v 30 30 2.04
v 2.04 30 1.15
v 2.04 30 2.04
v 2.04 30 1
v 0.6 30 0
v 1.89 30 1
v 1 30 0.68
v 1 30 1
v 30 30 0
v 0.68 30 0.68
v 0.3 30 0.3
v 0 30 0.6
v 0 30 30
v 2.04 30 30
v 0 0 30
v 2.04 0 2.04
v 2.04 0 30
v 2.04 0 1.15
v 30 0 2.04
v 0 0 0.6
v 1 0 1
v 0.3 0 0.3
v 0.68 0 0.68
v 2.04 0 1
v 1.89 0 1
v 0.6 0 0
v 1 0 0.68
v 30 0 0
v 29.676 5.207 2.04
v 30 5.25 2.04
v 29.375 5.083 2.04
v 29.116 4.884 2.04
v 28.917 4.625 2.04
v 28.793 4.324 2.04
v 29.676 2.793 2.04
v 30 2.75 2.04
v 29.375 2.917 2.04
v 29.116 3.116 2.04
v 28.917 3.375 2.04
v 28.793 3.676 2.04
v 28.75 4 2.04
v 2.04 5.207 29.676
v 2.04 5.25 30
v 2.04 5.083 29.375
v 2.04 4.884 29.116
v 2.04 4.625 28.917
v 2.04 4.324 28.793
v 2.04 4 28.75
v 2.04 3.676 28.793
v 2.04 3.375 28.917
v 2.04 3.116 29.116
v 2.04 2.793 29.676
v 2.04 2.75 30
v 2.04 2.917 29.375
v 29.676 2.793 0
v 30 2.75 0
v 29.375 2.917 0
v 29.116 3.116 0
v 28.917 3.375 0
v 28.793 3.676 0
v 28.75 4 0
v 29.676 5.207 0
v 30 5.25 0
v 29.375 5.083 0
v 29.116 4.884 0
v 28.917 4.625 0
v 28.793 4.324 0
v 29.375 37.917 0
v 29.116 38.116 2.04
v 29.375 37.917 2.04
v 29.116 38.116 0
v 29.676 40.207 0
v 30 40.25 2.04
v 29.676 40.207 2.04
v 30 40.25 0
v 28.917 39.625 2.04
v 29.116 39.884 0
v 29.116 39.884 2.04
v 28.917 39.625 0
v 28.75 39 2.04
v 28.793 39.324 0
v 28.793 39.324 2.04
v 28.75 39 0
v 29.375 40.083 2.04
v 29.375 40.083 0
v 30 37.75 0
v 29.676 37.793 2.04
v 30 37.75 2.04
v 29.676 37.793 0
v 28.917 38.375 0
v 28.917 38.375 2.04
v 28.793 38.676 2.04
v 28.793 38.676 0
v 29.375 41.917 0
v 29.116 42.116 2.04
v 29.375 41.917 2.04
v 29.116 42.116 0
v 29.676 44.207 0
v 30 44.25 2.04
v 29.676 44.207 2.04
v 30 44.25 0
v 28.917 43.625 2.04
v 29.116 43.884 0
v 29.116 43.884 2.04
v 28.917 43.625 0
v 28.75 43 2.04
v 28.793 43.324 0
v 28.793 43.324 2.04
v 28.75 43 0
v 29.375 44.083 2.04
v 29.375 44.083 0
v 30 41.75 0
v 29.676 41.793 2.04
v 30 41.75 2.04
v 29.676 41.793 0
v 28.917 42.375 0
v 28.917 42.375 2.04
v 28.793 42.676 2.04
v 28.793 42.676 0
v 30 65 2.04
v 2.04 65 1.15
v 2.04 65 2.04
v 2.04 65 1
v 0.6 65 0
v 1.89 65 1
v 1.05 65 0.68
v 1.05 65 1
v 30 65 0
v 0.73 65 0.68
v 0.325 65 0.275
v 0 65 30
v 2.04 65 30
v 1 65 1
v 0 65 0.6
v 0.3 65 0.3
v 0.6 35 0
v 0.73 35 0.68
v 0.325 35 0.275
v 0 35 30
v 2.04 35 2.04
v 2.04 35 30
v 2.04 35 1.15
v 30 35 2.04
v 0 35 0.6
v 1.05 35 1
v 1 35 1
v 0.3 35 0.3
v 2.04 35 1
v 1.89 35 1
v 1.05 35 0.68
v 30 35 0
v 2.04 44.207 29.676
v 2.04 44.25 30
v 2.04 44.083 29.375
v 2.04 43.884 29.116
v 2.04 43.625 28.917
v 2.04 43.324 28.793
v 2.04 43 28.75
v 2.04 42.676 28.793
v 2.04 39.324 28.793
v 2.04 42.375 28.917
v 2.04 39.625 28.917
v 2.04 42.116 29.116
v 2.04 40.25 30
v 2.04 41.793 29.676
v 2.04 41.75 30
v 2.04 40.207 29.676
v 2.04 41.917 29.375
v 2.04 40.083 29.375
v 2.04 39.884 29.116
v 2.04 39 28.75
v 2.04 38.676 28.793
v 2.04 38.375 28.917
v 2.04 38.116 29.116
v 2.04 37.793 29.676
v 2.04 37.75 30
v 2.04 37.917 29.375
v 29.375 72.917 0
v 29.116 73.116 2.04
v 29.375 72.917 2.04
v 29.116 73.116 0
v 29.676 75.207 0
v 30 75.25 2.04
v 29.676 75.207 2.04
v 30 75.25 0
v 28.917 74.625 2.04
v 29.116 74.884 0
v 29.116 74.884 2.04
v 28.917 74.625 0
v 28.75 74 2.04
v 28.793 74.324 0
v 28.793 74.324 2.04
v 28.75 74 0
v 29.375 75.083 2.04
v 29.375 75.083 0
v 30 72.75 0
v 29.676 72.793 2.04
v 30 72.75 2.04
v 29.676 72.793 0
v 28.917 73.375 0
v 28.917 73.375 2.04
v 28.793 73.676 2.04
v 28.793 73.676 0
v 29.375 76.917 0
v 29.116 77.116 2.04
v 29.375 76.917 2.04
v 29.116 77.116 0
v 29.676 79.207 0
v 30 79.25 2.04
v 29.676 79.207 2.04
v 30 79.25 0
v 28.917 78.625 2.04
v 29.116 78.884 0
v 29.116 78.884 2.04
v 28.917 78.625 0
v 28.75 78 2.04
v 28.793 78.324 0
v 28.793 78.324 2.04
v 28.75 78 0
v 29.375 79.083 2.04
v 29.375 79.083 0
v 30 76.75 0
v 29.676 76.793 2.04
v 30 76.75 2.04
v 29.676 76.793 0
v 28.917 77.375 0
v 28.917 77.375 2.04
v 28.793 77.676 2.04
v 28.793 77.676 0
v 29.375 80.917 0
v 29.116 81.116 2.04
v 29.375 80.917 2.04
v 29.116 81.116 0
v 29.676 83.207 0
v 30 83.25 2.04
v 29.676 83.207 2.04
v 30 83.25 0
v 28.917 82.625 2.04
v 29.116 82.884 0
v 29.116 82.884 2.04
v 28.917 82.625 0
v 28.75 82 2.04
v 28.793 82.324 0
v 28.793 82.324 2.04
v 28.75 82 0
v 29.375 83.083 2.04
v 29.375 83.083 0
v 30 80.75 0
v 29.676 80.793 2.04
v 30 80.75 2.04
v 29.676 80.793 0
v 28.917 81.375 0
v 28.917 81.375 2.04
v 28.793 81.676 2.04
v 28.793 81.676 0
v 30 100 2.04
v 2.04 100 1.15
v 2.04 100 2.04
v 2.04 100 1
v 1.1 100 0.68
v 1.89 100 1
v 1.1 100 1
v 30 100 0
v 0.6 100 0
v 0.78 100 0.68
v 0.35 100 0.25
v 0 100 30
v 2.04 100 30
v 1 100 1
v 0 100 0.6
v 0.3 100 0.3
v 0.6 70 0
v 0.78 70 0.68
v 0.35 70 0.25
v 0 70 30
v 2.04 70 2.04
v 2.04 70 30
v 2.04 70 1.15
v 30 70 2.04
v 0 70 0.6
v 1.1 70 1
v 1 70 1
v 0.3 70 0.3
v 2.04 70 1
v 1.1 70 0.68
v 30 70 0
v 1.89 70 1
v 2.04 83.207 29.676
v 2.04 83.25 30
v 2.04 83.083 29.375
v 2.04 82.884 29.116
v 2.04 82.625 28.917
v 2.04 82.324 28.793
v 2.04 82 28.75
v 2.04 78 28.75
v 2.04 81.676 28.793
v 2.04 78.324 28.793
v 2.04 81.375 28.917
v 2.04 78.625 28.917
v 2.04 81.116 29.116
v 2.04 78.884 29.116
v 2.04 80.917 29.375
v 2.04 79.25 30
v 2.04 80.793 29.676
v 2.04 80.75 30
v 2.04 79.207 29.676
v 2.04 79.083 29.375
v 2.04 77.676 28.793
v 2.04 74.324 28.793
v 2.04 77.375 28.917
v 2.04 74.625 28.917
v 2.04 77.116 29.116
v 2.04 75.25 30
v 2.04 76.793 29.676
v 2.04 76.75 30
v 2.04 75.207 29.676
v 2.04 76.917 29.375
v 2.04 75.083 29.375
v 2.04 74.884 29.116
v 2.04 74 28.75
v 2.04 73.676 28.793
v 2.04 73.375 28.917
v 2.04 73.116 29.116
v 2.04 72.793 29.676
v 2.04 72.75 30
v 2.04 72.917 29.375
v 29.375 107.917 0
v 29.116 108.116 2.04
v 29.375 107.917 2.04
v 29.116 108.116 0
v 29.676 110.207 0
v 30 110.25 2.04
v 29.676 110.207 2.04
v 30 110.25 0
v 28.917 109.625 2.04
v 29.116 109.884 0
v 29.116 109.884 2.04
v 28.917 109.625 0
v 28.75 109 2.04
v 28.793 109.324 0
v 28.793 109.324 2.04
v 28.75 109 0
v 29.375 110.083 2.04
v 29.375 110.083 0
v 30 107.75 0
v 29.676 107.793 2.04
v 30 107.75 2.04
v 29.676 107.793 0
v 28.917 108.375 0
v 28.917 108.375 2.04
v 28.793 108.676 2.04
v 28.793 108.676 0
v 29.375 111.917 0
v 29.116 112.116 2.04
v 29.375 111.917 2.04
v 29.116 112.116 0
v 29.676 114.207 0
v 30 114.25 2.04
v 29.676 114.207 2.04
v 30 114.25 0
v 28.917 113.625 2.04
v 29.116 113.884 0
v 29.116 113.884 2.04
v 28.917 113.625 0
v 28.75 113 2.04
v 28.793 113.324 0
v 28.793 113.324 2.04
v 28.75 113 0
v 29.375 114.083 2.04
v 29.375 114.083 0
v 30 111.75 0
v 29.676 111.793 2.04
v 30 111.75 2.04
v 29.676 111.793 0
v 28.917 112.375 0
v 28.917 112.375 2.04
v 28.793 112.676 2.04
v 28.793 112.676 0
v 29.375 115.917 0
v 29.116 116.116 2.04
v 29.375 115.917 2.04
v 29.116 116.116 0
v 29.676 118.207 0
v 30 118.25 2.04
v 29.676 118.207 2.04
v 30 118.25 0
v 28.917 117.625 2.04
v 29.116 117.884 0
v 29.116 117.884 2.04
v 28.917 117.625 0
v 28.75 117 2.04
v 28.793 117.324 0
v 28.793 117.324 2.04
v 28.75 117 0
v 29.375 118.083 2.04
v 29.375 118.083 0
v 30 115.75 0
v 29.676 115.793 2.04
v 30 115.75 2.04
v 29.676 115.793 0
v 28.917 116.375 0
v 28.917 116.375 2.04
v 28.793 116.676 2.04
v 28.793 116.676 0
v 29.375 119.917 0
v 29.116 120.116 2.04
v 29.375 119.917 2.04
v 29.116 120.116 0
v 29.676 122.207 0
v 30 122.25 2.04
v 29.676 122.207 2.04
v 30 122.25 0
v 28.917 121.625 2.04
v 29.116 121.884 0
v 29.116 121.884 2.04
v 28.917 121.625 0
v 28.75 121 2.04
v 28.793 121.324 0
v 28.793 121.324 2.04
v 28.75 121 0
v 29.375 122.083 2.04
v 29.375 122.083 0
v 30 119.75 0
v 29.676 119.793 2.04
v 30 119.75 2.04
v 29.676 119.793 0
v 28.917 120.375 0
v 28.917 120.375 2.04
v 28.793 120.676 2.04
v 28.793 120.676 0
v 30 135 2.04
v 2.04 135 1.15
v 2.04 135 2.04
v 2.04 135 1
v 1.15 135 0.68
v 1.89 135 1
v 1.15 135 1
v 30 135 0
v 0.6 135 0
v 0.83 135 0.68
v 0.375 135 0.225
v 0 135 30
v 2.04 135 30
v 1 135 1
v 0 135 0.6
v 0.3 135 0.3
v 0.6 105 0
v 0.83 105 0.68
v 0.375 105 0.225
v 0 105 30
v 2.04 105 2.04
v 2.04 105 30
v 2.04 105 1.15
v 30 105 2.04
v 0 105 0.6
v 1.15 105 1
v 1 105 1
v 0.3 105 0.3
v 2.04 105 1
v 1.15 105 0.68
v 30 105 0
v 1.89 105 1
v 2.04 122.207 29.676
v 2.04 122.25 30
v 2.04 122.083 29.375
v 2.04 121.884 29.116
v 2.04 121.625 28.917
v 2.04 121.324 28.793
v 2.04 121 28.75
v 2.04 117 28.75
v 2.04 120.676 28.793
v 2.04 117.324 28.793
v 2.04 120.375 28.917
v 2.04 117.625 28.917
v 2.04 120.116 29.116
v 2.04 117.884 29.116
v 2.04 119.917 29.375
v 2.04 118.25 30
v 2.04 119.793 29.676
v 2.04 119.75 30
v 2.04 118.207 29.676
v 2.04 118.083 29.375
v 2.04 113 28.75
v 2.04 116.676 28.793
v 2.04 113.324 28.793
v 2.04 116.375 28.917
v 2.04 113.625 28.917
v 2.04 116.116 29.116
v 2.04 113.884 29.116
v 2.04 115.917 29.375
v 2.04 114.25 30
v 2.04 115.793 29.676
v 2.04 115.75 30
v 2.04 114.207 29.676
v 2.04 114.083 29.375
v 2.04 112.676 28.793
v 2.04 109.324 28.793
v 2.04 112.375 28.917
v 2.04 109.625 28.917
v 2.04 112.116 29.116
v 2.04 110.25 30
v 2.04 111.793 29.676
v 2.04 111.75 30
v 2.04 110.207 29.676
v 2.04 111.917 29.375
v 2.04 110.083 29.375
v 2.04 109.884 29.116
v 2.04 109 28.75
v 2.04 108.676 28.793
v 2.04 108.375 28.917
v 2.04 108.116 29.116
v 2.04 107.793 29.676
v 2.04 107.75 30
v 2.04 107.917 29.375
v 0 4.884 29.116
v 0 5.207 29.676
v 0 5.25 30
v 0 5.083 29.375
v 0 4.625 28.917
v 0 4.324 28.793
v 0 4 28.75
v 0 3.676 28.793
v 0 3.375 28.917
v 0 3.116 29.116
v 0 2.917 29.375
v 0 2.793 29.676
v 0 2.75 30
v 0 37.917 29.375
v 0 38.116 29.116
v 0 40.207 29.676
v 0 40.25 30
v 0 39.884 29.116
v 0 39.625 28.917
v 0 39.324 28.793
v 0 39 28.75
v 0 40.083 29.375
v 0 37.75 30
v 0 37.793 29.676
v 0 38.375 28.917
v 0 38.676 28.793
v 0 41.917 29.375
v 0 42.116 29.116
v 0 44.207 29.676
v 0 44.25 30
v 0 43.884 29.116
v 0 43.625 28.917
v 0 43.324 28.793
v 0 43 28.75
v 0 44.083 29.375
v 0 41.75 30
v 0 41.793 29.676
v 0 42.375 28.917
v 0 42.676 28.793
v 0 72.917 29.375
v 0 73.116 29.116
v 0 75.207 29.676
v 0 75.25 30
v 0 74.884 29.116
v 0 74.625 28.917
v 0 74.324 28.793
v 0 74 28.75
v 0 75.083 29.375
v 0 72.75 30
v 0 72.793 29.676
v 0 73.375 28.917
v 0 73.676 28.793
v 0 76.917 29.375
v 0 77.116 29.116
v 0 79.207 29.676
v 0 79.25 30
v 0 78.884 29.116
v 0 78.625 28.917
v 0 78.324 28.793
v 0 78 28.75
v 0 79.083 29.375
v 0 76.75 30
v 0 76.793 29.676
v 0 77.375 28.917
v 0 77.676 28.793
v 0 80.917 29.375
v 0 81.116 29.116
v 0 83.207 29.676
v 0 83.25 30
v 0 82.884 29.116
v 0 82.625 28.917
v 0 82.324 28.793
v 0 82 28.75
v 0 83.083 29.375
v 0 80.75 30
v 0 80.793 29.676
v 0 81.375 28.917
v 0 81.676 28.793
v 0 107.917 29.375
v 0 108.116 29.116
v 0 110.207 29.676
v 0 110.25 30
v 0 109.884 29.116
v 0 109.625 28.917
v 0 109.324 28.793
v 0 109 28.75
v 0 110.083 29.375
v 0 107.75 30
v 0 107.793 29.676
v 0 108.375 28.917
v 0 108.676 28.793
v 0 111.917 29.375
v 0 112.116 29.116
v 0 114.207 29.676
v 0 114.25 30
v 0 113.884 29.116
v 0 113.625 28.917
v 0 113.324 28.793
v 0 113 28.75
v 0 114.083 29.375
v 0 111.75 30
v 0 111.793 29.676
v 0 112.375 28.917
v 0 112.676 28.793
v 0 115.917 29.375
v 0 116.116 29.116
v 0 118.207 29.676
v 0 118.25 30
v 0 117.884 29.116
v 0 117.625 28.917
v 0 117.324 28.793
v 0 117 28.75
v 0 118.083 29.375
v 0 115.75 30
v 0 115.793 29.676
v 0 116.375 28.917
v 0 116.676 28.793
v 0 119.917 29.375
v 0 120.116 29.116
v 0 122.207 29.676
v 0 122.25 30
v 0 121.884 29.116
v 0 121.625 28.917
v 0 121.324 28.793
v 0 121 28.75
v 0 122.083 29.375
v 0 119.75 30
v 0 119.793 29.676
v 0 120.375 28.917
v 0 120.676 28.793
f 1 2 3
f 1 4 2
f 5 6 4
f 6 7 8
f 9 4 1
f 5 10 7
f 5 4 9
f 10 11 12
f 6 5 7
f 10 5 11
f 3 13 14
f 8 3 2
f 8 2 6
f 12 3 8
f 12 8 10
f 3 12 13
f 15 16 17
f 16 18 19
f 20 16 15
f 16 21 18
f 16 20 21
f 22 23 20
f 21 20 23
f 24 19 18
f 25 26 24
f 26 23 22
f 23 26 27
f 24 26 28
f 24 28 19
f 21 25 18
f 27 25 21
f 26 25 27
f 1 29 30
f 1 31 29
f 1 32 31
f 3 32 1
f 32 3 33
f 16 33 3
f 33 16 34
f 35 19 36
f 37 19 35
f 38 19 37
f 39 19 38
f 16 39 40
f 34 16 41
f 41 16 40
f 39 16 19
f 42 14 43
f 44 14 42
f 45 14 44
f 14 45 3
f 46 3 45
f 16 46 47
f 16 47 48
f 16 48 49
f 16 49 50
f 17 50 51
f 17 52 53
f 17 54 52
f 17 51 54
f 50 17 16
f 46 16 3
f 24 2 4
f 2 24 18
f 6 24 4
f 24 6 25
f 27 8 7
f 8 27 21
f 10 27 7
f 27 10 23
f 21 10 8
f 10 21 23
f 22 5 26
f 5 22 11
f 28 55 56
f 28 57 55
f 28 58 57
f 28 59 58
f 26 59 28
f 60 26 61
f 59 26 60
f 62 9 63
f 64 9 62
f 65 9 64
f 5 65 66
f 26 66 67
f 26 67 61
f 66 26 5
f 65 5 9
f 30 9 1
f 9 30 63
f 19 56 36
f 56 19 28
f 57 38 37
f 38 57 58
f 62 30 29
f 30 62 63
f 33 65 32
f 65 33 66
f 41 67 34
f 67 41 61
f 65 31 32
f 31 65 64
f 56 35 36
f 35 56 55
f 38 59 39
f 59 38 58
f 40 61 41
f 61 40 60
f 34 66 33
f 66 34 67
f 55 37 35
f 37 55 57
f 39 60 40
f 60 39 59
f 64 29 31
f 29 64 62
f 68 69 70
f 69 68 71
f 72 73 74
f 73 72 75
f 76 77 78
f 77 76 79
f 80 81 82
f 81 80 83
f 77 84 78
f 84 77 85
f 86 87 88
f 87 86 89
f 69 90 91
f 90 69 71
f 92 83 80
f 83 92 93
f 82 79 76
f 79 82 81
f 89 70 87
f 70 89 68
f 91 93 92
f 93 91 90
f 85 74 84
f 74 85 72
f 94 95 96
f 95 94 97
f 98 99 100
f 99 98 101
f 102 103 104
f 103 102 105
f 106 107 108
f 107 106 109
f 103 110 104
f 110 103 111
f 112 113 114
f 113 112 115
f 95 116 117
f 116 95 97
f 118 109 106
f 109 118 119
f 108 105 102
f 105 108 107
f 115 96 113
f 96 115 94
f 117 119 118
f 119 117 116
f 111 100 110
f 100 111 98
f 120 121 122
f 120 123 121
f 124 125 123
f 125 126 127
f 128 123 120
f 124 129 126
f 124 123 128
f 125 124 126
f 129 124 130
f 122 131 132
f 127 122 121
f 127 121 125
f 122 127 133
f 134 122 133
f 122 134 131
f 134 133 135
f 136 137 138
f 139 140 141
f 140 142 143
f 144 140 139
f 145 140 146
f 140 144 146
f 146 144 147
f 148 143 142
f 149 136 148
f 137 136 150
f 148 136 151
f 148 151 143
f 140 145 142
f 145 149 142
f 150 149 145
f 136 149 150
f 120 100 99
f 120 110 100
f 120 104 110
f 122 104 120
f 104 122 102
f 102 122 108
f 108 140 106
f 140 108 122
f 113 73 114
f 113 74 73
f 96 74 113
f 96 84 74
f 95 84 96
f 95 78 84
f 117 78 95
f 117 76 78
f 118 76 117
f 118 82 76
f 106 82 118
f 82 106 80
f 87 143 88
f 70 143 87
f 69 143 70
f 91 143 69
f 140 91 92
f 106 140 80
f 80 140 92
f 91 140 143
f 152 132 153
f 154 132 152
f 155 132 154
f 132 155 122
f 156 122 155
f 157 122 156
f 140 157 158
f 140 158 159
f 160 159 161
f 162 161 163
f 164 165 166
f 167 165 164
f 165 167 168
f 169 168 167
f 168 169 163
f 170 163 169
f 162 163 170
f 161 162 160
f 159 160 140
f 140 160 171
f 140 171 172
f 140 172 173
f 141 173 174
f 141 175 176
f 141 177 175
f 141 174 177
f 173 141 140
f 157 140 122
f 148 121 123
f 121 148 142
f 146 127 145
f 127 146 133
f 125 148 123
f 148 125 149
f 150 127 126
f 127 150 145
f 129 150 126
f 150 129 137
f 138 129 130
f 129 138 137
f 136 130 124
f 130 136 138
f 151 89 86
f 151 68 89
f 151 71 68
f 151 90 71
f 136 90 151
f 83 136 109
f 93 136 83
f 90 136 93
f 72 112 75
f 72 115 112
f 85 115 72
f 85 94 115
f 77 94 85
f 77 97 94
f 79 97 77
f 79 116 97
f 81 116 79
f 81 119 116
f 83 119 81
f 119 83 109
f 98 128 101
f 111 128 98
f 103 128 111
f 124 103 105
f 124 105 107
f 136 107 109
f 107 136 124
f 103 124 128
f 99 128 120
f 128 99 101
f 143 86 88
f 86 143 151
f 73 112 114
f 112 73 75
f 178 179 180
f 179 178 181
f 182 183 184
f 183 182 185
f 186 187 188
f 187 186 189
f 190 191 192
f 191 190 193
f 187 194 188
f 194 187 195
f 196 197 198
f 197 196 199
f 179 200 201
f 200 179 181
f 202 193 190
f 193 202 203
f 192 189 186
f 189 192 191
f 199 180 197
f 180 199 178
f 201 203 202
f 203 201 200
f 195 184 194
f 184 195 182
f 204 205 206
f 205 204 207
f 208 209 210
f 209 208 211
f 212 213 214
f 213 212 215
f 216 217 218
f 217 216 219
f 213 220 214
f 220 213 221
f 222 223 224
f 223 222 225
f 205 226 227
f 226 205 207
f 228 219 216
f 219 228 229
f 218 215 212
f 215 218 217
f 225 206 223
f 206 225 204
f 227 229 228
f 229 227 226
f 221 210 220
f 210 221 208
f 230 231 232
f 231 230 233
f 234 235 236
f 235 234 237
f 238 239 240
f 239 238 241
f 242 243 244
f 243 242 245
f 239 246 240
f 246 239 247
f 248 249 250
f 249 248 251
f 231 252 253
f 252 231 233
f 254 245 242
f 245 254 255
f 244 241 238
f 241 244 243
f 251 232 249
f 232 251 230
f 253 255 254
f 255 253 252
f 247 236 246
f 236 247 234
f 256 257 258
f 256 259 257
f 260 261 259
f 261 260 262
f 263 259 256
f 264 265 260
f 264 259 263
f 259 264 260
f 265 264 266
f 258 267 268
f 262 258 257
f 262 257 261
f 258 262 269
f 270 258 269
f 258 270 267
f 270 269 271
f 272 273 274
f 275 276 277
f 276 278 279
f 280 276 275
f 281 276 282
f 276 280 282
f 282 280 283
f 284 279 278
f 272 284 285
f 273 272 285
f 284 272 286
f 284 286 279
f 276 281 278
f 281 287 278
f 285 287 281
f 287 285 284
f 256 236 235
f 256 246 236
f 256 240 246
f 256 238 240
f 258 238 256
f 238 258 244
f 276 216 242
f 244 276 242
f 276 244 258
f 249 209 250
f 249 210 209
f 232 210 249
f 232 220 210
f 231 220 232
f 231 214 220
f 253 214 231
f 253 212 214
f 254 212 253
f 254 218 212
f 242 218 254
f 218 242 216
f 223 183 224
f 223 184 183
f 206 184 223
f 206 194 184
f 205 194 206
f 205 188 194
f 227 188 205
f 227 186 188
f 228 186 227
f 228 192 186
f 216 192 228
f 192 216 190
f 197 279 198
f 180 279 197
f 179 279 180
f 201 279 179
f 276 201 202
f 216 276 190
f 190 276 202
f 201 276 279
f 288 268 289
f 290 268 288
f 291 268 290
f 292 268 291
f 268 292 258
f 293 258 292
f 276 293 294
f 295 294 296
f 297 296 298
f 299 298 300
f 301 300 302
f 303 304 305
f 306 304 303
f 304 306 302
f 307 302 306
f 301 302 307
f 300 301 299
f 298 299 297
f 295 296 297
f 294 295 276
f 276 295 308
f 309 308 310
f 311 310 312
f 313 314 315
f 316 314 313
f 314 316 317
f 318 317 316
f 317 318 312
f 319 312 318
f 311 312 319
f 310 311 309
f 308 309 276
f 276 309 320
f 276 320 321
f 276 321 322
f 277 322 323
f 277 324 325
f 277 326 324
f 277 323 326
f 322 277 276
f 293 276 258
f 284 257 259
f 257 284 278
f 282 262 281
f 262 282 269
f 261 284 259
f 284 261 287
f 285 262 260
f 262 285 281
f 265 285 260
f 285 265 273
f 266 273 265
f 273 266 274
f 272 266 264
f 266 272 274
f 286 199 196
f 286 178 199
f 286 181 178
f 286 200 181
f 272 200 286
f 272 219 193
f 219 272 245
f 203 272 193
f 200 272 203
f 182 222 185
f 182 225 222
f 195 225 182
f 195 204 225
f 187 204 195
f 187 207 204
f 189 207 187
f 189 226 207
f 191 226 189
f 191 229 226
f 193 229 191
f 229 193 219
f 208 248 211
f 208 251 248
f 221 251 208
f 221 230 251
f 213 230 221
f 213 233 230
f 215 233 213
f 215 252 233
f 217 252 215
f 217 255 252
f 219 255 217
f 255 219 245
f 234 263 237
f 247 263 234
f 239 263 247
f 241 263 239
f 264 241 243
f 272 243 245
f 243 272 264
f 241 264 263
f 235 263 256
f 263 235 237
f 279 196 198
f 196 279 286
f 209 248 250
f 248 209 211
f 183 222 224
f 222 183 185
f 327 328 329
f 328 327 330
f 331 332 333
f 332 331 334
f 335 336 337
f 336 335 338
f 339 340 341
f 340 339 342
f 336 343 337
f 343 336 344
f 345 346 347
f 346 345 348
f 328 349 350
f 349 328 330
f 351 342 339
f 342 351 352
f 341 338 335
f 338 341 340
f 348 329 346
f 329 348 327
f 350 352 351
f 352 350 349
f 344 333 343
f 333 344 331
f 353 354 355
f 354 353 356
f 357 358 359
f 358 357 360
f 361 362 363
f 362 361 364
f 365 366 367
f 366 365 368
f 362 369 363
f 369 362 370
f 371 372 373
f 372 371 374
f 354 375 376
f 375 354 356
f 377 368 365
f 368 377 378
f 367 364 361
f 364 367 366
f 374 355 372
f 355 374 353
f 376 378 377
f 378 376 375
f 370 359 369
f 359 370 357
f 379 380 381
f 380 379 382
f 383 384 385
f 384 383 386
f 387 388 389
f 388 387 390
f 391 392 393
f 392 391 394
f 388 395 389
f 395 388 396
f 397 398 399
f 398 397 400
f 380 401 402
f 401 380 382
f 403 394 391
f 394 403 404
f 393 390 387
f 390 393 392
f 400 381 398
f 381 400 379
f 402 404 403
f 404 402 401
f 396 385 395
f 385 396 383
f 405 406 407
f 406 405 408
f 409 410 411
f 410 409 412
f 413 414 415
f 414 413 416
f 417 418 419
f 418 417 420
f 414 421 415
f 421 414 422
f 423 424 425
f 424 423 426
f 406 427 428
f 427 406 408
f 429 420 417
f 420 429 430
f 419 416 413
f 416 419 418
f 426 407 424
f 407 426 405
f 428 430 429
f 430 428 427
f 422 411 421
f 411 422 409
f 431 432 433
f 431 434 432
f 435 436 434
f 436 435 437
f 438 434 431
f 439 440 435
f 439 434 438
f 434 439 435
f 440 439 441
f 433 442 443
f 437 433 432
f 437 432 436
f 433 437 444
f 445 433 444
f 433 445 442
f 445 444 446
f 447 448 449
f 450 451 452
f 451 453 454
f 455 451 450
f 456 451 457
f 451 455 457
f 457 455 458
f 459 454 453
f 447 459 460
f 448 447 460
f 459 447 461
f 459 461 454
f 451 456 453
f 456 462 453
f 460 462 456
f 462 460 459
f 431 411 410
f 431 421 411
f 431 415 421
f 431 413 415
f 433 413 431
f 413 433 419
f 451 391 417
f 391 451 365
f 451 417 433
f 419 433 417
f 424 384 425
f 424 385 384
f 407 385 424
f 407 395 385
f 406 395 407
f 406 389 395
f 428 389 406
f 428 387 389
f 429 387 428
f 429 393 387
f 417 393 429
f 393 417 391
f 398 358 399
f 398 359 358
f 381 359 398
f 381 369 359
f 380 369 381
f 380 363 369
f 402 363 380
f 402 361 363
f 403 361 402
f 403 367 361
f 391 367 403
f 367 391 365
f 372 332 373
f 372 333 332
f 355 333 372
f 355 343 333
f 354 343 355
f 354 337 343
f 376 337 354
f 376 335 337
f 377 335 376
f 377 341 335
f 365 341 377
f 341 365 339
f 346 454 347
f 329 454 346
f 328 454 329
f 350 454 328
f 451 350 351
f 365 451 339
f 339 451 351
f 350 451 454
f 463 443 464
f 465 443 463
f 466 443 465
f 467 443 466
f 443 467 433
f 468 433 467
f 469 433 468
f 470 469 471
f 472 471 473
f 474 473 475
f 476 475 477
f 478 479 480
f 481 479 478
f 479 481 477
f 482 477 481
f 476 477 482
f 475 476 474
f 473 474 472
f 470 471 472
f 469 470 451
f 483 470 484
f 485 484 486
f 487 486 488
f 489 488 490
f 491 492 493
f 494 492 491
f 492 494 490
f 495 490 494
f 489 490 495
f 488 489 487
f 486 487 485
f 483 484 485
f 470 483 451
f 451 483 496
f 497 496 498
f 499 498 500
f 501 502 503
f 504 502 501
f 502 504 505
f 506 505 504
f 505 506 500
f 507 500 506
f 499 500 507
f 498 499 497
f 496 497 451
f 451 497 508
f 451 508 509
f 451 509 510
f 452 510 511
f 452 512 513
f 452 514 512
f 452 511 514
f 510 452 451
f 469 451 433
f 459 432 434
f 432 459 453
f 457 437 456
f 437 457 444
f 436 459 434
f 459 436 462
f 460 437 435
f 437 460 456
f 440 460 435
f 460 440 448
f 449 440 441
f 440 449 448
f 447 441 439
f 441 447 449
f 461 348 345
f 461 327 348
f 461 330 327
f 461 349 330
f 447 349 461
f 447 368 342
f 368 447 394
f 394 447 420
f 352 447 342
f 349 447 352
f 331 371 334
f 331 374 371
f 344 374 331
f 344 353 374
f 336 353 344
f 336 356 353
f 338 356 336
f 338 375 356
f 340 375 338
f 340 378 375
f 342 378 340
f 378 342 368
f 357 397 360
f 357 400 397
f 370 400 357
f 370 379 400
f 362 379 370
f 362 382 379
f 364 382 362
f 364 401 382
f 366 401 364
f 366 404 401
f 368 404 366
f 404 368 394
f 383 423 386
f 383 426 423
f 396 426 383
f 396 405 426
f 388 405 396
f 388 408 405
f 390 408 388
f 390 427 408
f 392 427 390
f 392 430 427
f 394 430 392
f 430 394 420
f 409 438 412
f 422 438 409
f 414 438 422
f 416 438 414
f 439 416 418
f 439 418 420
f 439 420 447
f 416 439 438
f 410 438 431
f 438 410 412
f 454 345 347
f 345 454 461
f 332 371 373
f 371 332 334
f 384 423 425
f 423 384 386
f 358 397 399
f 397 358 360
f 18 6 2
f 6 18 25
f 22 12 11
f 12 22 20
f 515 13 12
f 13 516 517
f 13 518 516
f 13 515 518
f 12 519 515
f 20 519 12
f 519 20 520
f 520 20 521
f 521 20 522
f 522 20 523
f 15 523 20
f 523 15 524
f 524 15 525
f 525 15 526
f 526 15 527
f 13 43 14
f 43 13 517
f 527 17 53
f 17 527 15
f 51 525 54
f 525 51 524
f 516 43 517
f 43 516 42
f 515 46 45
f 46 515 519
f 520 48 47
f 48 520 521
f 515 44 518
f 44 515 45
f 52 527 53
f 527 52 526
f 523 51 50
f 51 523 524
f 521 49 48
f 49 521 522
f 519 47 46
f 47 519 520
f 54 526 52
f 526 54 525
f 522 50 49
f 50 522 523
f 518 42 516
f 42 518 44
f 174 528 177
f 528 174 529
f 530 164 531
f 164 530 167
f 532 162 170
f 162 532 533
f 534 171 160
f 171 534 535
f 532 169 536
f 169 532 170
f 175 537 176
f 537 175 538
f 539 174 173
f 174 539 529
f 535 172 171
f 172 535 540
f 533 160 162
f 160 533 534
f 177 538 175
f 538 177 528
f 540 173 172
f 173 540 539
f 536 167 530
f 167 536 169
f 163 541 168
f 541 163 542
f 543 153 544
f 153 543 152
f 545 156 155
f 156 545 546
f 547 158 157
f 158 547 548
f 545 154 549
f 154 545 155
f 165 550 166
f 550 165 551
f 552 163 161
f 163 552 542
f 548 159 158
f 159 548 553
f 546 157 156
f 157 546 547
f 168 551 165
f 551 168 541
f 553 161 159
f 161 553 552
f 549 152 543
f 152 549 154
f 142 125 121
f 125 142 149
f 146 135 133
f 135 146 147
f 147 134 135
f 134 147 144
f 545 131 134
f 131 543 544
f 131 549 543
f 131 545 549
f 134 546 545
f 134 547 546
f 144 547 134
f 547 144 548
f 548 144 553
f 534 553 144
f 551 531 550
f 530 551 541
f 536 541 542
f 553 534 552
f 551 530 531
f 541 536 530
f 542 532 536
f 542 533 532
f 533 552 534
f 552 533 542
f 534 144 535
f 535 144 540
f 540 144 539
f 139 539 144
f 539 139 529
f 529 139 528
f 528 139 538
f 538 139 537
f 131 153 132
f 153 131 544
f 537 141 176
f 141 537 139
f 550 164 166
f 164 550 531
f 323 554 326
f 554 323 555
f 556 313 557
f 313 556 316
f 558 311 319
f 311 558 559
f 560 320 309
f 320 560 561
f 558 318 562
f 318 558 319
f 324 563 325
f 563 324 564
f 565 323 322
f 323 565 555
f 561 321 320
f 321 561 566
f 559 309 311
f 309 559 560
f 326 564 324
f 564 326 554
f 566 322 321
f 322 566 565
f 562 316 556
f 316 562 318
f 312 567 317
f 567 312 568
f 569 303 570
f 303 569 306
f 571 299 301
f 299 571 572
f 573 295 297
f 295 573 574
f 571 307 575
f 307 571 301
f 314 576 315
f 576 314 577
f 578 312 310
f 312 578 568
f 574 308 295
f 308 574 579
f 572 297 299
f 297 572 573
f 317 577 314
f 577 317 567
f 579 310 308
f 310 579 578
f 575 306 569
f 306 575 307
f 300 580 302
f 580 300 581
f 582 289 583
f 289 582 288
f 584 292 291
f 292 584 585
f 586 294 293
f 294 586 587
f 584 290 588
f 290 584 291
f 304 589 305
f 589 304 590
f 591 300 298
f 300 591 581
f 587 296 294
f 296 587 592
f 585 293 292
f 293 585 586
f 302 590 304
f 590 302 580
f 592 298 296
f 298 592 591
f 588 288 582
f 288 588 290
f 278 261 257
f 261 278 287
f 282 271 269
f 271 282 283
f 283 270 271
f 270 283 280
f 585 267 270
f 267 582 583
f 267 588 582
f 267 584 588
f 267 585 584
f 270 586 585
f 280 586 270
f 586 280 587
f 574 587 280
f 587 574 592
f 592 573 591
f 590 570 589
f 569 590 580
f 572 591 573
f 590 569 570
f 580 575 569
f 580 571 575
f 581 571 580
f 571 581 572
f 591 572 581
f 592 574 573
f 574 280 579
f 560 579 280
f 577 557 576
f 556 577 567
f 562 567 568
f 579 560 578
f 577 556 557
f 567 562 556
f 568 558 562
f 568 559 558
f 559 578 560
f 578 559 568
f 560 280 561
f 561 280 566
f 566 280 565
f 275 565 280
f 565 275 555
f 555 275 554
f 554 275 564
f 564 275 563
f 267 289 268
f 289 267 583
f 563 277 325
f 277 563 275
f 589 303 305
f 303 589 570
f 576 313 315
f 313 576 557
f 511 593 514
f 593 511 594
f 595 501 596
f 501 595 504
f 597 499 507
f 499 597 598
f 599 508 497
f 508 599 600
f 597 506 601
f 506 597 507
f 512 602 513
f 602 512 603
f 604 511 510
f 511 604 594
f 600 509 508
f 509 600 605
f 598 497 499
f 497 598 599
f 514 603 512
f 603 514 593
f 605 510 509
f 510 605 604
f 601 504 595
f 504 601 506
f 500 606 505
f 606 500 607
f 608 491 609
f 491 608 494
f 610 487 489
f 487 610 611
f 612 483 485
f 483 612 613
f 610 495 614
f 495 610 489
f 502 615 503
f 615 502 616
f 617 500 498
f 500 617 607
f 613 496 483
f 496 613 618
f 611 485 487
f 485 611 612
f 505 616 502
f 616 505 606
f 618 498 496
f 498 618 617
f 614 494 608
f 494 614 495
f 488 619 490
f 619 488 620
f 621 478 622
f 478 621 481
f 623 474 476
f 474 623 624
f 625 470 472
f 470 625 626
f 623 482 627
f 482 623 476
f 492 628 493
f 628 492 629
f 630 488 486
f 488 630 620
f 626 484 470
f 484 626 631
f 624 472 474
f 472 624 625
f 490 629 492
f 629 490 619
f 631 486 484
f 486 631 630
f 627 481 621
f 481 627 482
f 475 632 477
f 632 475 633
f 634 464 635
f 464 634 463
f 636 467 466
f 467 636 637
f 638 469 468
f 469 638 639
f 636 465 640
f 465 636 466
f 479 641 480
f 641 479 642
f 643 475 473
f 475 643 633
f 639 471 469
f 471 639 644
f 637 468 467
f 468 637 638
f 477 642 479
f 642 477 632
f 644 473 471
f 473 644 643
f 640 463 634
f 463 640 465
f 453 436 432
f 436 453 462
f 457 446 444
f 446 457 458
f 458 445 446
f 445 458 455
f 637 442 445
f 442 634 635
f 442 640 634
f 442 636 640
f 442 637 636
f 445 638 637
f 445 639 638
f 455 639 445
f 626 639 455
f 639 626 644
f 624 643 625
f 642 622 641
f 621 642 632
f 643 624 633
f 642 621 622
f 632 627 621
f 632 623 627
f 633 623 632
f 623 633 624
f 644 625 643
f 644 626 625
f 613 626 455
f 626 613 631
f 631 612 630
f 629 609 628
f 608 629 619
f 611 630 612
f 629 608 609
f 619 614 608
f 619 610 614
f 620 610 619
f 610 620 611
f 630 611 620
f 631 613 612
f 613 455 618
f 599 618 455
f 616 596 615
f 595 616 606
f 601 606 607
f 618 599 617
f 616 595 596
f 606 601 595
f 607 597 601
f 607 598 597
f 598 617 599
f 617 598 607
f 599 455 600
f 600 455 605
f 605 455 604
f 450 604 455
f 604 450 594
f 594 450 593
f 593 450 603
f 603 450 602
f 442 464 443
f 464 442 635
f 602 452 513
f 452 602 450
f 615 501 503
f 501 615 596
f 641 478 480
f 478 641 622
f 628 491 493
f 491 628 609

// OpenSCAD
// file: ../../lib/piece.scad
// Pieces: what a print is made of, as the slicer sees it.
//
//   use <../../lib/piece.scad>
//   piece("lid", "bottom_surface_pattern=concentric") color("green") lid();
//
// A piece is a part in Orca, with a name and, if it likes, slicer settings of
// its own, written like a `// orca:` line (see python/generate.py, which makes
// the projects). Draw every solid of a print inside one; they can be anywhere,
// in a module as well as at the top of the file, but not inside each other.
// Either mistake stops the export: a solid in no piece would be in all of them.
//
// OpenSCAD has no way to hand over one piece of what it draws, or to name
// it. So a piece says what it is in the log, and generate.py asks for each in
// turn, by setting $only: then every other piece draws nothing.
//
// Pieces that share a name and settings come out together. Give them
// different colors and each is still a part of its own, so long as they are
// separate statements at the top of the file; drawn inside a module they are
// one solid, and want names of their own.
//
// $piece_prefix goes before the names of the pieces drawn under it, to tell
// apart those of a module drawn more than once.

module piece(name, orca = "") {
  assert(name != "", "a piece wants a name");
  outer = is_undef($in_piece) ? "" : $in_piece;
  assert(outer == "", str("piece ", name, " is inside piece ", outer, ", and would never be drawn"));
  full = is_undef($piece_prefix) || $piece_prefix == "" ? name : str($piece_prefix, " ", name);
  echo(piece = full, orca = orca);
  if (is_undef($only) || $only == [full, orca]) {
    $in_piece = full;
    children();
  }
}

// Settings for a piece: the pattern its outside face prints in, on the bed.
function piece_bottom(pattern) = str("bottom_surface_pattern=", pattern);
// Monotonic lines at angle a on the bed, from +x.
function piece_lines(a) = str(piece_bottom("monotonic"), " solid_infill_direction=", a);
// main file
// Coupon for a mitred rabbet: the corner joint for boxes glued up from flat
// panels, each printed with its outside face on the bed.
//
// The mitre runs only through the outer `mitre` of the wall. Inside it, panel
// A ends square and sits in a rabbet in panel B. Printed outside down, every
// mating face is a wall or faces up; nothing overhangs.
//
// The rabbet locates A, and squares it: A's end on its floor, A's inside face
// against its shoulder. The mitre only has to look closed, so B's half of it
// stands off by a gap. A printed 45° face is stepped, and proud of the model
// by some of a layer; with no gap the mitres meet first, and lever A off the
// rabbet and out of square.
//
// Four pairs, at the gaps in `mitre_gaps`; a pair's notches count its place
// in that list.
//
// Tried and dropped: printing A and B as one piece joined by a skin of one to
// three layers, to fold up warm. Every one folded well past 90°, and the
// skin creased white.

// The 0.08 High Quality process: fine steps on the mitre, slow outer walls.
// Seams at the back, on the coupons' far ends and off the joint.
// export: print
// orca: process="0.08 High Quality" layer_height=0.08 initial_layer_print_height=0.2 seam_position=back

use <../../lib/piece.scad>

/* [Output] */
part = "fit"; // [fit, print]

/* [Joint] */
// Panel thickness. Rough; see `t`.
thick = 2;
// Depth of the mitre below the outside faces; also the thickness of B's
// tongue under the rabbet. Rough; see `mitre`.
mitre_depth = 1;
// Gaps to try between the mitre's faces, measured along a panel's face.
mitre_gaps = [0, 0.05, 0.1, 0.15];
// Depth of the glue break: a trough under the mitre's inner end, cut from
// B. The joint goes together dry, and thin glue run along the
// inside corner wicks through the rabbet; it can't cross the trough, so it
// stops short of the mitre and the outside. Rough; see `brk`.
break_depth = 0.3;
// Chamfer on the box's outside edge.
chamfer = 0.6;
// Relief on A's inside end corner, to clear the rabbet's inside corner.
relief = 0.15;

/* [Layers] */
// As sliced. Heights in the joint snap to whole layers.
first_layer = 0.2;
layer = 0.08;

/* [Coupon] */
// Along the edge, and each panel's reach away from it.
len = 30;
width = 30;
bed_gap = 5;

/* [Hidden] */
$fn = 24;
c = chamfer;

// h to the nearest height the slicer ends a layer at.
function snap(h) = first_layer + round((h - first_layer) / layer) * layer;
t = snap(thick);
mitre = snap(mitre_depth);
brk = round(break_depth / layer) * layer;

// Profiles as printed: x away from the corner, y up from the outside face.
module a_2d() {
  polygon([[c, 0], [width, 0], [width, t], [mitre + relief, t], [mitre, t - relief],
           [mitre, mitre], [c / 2, c / 2]]);
}

module b_2d(k) {
  polygon([[c, 0], [width, 0], [width, t], [t, t], [t, mitre], [mitre + k, mitre],
           [mitre + k, mitre - brk], [mitre - brk + k, mitre - brk], [(c + k) / 2, (c - k) / 2]]);
}

// A profile stood up into a panel, len along y, with n notches in its far end.
module coupon(n) {
  difference() {
    translate([0, len, 0]) rotate([90, 0, 0]) linear_extrude(len) children();
    for (i = [0 : 1 : n - 1]) translate([width, 4 + 4 * i, -1]) cylinder(d = 2.5, h = 10);
  }
}

module pair(i) {
  translate([0, i * (len + bed_gap), 0]) children();
}

// One statement, so one object, for all the B panels and one for all the A.
piece("B") color("darkgreen")
  for (i = [0 : len(mitre_gaps) - 1]) pair(i) coupon(i + 1) b_2d(mitre_gaps[i]);
piece("A") color(part == "print" ? "darkgreen" : "forestgreen") for (i = [0 : len(mitre_gaps) - 1]) pair(i)
  if (part == "print") translate([width + bed_gap, 0, 0]) coupon(i + 1) a_2d();
  // Stood on B: A's depth runs along x, its length up.
  else multmatrix([[0, 0, 1, 0], [0, 1, 0, 0], [1, 0, 0, 0]]) coupon(i + 1) a_2d();
